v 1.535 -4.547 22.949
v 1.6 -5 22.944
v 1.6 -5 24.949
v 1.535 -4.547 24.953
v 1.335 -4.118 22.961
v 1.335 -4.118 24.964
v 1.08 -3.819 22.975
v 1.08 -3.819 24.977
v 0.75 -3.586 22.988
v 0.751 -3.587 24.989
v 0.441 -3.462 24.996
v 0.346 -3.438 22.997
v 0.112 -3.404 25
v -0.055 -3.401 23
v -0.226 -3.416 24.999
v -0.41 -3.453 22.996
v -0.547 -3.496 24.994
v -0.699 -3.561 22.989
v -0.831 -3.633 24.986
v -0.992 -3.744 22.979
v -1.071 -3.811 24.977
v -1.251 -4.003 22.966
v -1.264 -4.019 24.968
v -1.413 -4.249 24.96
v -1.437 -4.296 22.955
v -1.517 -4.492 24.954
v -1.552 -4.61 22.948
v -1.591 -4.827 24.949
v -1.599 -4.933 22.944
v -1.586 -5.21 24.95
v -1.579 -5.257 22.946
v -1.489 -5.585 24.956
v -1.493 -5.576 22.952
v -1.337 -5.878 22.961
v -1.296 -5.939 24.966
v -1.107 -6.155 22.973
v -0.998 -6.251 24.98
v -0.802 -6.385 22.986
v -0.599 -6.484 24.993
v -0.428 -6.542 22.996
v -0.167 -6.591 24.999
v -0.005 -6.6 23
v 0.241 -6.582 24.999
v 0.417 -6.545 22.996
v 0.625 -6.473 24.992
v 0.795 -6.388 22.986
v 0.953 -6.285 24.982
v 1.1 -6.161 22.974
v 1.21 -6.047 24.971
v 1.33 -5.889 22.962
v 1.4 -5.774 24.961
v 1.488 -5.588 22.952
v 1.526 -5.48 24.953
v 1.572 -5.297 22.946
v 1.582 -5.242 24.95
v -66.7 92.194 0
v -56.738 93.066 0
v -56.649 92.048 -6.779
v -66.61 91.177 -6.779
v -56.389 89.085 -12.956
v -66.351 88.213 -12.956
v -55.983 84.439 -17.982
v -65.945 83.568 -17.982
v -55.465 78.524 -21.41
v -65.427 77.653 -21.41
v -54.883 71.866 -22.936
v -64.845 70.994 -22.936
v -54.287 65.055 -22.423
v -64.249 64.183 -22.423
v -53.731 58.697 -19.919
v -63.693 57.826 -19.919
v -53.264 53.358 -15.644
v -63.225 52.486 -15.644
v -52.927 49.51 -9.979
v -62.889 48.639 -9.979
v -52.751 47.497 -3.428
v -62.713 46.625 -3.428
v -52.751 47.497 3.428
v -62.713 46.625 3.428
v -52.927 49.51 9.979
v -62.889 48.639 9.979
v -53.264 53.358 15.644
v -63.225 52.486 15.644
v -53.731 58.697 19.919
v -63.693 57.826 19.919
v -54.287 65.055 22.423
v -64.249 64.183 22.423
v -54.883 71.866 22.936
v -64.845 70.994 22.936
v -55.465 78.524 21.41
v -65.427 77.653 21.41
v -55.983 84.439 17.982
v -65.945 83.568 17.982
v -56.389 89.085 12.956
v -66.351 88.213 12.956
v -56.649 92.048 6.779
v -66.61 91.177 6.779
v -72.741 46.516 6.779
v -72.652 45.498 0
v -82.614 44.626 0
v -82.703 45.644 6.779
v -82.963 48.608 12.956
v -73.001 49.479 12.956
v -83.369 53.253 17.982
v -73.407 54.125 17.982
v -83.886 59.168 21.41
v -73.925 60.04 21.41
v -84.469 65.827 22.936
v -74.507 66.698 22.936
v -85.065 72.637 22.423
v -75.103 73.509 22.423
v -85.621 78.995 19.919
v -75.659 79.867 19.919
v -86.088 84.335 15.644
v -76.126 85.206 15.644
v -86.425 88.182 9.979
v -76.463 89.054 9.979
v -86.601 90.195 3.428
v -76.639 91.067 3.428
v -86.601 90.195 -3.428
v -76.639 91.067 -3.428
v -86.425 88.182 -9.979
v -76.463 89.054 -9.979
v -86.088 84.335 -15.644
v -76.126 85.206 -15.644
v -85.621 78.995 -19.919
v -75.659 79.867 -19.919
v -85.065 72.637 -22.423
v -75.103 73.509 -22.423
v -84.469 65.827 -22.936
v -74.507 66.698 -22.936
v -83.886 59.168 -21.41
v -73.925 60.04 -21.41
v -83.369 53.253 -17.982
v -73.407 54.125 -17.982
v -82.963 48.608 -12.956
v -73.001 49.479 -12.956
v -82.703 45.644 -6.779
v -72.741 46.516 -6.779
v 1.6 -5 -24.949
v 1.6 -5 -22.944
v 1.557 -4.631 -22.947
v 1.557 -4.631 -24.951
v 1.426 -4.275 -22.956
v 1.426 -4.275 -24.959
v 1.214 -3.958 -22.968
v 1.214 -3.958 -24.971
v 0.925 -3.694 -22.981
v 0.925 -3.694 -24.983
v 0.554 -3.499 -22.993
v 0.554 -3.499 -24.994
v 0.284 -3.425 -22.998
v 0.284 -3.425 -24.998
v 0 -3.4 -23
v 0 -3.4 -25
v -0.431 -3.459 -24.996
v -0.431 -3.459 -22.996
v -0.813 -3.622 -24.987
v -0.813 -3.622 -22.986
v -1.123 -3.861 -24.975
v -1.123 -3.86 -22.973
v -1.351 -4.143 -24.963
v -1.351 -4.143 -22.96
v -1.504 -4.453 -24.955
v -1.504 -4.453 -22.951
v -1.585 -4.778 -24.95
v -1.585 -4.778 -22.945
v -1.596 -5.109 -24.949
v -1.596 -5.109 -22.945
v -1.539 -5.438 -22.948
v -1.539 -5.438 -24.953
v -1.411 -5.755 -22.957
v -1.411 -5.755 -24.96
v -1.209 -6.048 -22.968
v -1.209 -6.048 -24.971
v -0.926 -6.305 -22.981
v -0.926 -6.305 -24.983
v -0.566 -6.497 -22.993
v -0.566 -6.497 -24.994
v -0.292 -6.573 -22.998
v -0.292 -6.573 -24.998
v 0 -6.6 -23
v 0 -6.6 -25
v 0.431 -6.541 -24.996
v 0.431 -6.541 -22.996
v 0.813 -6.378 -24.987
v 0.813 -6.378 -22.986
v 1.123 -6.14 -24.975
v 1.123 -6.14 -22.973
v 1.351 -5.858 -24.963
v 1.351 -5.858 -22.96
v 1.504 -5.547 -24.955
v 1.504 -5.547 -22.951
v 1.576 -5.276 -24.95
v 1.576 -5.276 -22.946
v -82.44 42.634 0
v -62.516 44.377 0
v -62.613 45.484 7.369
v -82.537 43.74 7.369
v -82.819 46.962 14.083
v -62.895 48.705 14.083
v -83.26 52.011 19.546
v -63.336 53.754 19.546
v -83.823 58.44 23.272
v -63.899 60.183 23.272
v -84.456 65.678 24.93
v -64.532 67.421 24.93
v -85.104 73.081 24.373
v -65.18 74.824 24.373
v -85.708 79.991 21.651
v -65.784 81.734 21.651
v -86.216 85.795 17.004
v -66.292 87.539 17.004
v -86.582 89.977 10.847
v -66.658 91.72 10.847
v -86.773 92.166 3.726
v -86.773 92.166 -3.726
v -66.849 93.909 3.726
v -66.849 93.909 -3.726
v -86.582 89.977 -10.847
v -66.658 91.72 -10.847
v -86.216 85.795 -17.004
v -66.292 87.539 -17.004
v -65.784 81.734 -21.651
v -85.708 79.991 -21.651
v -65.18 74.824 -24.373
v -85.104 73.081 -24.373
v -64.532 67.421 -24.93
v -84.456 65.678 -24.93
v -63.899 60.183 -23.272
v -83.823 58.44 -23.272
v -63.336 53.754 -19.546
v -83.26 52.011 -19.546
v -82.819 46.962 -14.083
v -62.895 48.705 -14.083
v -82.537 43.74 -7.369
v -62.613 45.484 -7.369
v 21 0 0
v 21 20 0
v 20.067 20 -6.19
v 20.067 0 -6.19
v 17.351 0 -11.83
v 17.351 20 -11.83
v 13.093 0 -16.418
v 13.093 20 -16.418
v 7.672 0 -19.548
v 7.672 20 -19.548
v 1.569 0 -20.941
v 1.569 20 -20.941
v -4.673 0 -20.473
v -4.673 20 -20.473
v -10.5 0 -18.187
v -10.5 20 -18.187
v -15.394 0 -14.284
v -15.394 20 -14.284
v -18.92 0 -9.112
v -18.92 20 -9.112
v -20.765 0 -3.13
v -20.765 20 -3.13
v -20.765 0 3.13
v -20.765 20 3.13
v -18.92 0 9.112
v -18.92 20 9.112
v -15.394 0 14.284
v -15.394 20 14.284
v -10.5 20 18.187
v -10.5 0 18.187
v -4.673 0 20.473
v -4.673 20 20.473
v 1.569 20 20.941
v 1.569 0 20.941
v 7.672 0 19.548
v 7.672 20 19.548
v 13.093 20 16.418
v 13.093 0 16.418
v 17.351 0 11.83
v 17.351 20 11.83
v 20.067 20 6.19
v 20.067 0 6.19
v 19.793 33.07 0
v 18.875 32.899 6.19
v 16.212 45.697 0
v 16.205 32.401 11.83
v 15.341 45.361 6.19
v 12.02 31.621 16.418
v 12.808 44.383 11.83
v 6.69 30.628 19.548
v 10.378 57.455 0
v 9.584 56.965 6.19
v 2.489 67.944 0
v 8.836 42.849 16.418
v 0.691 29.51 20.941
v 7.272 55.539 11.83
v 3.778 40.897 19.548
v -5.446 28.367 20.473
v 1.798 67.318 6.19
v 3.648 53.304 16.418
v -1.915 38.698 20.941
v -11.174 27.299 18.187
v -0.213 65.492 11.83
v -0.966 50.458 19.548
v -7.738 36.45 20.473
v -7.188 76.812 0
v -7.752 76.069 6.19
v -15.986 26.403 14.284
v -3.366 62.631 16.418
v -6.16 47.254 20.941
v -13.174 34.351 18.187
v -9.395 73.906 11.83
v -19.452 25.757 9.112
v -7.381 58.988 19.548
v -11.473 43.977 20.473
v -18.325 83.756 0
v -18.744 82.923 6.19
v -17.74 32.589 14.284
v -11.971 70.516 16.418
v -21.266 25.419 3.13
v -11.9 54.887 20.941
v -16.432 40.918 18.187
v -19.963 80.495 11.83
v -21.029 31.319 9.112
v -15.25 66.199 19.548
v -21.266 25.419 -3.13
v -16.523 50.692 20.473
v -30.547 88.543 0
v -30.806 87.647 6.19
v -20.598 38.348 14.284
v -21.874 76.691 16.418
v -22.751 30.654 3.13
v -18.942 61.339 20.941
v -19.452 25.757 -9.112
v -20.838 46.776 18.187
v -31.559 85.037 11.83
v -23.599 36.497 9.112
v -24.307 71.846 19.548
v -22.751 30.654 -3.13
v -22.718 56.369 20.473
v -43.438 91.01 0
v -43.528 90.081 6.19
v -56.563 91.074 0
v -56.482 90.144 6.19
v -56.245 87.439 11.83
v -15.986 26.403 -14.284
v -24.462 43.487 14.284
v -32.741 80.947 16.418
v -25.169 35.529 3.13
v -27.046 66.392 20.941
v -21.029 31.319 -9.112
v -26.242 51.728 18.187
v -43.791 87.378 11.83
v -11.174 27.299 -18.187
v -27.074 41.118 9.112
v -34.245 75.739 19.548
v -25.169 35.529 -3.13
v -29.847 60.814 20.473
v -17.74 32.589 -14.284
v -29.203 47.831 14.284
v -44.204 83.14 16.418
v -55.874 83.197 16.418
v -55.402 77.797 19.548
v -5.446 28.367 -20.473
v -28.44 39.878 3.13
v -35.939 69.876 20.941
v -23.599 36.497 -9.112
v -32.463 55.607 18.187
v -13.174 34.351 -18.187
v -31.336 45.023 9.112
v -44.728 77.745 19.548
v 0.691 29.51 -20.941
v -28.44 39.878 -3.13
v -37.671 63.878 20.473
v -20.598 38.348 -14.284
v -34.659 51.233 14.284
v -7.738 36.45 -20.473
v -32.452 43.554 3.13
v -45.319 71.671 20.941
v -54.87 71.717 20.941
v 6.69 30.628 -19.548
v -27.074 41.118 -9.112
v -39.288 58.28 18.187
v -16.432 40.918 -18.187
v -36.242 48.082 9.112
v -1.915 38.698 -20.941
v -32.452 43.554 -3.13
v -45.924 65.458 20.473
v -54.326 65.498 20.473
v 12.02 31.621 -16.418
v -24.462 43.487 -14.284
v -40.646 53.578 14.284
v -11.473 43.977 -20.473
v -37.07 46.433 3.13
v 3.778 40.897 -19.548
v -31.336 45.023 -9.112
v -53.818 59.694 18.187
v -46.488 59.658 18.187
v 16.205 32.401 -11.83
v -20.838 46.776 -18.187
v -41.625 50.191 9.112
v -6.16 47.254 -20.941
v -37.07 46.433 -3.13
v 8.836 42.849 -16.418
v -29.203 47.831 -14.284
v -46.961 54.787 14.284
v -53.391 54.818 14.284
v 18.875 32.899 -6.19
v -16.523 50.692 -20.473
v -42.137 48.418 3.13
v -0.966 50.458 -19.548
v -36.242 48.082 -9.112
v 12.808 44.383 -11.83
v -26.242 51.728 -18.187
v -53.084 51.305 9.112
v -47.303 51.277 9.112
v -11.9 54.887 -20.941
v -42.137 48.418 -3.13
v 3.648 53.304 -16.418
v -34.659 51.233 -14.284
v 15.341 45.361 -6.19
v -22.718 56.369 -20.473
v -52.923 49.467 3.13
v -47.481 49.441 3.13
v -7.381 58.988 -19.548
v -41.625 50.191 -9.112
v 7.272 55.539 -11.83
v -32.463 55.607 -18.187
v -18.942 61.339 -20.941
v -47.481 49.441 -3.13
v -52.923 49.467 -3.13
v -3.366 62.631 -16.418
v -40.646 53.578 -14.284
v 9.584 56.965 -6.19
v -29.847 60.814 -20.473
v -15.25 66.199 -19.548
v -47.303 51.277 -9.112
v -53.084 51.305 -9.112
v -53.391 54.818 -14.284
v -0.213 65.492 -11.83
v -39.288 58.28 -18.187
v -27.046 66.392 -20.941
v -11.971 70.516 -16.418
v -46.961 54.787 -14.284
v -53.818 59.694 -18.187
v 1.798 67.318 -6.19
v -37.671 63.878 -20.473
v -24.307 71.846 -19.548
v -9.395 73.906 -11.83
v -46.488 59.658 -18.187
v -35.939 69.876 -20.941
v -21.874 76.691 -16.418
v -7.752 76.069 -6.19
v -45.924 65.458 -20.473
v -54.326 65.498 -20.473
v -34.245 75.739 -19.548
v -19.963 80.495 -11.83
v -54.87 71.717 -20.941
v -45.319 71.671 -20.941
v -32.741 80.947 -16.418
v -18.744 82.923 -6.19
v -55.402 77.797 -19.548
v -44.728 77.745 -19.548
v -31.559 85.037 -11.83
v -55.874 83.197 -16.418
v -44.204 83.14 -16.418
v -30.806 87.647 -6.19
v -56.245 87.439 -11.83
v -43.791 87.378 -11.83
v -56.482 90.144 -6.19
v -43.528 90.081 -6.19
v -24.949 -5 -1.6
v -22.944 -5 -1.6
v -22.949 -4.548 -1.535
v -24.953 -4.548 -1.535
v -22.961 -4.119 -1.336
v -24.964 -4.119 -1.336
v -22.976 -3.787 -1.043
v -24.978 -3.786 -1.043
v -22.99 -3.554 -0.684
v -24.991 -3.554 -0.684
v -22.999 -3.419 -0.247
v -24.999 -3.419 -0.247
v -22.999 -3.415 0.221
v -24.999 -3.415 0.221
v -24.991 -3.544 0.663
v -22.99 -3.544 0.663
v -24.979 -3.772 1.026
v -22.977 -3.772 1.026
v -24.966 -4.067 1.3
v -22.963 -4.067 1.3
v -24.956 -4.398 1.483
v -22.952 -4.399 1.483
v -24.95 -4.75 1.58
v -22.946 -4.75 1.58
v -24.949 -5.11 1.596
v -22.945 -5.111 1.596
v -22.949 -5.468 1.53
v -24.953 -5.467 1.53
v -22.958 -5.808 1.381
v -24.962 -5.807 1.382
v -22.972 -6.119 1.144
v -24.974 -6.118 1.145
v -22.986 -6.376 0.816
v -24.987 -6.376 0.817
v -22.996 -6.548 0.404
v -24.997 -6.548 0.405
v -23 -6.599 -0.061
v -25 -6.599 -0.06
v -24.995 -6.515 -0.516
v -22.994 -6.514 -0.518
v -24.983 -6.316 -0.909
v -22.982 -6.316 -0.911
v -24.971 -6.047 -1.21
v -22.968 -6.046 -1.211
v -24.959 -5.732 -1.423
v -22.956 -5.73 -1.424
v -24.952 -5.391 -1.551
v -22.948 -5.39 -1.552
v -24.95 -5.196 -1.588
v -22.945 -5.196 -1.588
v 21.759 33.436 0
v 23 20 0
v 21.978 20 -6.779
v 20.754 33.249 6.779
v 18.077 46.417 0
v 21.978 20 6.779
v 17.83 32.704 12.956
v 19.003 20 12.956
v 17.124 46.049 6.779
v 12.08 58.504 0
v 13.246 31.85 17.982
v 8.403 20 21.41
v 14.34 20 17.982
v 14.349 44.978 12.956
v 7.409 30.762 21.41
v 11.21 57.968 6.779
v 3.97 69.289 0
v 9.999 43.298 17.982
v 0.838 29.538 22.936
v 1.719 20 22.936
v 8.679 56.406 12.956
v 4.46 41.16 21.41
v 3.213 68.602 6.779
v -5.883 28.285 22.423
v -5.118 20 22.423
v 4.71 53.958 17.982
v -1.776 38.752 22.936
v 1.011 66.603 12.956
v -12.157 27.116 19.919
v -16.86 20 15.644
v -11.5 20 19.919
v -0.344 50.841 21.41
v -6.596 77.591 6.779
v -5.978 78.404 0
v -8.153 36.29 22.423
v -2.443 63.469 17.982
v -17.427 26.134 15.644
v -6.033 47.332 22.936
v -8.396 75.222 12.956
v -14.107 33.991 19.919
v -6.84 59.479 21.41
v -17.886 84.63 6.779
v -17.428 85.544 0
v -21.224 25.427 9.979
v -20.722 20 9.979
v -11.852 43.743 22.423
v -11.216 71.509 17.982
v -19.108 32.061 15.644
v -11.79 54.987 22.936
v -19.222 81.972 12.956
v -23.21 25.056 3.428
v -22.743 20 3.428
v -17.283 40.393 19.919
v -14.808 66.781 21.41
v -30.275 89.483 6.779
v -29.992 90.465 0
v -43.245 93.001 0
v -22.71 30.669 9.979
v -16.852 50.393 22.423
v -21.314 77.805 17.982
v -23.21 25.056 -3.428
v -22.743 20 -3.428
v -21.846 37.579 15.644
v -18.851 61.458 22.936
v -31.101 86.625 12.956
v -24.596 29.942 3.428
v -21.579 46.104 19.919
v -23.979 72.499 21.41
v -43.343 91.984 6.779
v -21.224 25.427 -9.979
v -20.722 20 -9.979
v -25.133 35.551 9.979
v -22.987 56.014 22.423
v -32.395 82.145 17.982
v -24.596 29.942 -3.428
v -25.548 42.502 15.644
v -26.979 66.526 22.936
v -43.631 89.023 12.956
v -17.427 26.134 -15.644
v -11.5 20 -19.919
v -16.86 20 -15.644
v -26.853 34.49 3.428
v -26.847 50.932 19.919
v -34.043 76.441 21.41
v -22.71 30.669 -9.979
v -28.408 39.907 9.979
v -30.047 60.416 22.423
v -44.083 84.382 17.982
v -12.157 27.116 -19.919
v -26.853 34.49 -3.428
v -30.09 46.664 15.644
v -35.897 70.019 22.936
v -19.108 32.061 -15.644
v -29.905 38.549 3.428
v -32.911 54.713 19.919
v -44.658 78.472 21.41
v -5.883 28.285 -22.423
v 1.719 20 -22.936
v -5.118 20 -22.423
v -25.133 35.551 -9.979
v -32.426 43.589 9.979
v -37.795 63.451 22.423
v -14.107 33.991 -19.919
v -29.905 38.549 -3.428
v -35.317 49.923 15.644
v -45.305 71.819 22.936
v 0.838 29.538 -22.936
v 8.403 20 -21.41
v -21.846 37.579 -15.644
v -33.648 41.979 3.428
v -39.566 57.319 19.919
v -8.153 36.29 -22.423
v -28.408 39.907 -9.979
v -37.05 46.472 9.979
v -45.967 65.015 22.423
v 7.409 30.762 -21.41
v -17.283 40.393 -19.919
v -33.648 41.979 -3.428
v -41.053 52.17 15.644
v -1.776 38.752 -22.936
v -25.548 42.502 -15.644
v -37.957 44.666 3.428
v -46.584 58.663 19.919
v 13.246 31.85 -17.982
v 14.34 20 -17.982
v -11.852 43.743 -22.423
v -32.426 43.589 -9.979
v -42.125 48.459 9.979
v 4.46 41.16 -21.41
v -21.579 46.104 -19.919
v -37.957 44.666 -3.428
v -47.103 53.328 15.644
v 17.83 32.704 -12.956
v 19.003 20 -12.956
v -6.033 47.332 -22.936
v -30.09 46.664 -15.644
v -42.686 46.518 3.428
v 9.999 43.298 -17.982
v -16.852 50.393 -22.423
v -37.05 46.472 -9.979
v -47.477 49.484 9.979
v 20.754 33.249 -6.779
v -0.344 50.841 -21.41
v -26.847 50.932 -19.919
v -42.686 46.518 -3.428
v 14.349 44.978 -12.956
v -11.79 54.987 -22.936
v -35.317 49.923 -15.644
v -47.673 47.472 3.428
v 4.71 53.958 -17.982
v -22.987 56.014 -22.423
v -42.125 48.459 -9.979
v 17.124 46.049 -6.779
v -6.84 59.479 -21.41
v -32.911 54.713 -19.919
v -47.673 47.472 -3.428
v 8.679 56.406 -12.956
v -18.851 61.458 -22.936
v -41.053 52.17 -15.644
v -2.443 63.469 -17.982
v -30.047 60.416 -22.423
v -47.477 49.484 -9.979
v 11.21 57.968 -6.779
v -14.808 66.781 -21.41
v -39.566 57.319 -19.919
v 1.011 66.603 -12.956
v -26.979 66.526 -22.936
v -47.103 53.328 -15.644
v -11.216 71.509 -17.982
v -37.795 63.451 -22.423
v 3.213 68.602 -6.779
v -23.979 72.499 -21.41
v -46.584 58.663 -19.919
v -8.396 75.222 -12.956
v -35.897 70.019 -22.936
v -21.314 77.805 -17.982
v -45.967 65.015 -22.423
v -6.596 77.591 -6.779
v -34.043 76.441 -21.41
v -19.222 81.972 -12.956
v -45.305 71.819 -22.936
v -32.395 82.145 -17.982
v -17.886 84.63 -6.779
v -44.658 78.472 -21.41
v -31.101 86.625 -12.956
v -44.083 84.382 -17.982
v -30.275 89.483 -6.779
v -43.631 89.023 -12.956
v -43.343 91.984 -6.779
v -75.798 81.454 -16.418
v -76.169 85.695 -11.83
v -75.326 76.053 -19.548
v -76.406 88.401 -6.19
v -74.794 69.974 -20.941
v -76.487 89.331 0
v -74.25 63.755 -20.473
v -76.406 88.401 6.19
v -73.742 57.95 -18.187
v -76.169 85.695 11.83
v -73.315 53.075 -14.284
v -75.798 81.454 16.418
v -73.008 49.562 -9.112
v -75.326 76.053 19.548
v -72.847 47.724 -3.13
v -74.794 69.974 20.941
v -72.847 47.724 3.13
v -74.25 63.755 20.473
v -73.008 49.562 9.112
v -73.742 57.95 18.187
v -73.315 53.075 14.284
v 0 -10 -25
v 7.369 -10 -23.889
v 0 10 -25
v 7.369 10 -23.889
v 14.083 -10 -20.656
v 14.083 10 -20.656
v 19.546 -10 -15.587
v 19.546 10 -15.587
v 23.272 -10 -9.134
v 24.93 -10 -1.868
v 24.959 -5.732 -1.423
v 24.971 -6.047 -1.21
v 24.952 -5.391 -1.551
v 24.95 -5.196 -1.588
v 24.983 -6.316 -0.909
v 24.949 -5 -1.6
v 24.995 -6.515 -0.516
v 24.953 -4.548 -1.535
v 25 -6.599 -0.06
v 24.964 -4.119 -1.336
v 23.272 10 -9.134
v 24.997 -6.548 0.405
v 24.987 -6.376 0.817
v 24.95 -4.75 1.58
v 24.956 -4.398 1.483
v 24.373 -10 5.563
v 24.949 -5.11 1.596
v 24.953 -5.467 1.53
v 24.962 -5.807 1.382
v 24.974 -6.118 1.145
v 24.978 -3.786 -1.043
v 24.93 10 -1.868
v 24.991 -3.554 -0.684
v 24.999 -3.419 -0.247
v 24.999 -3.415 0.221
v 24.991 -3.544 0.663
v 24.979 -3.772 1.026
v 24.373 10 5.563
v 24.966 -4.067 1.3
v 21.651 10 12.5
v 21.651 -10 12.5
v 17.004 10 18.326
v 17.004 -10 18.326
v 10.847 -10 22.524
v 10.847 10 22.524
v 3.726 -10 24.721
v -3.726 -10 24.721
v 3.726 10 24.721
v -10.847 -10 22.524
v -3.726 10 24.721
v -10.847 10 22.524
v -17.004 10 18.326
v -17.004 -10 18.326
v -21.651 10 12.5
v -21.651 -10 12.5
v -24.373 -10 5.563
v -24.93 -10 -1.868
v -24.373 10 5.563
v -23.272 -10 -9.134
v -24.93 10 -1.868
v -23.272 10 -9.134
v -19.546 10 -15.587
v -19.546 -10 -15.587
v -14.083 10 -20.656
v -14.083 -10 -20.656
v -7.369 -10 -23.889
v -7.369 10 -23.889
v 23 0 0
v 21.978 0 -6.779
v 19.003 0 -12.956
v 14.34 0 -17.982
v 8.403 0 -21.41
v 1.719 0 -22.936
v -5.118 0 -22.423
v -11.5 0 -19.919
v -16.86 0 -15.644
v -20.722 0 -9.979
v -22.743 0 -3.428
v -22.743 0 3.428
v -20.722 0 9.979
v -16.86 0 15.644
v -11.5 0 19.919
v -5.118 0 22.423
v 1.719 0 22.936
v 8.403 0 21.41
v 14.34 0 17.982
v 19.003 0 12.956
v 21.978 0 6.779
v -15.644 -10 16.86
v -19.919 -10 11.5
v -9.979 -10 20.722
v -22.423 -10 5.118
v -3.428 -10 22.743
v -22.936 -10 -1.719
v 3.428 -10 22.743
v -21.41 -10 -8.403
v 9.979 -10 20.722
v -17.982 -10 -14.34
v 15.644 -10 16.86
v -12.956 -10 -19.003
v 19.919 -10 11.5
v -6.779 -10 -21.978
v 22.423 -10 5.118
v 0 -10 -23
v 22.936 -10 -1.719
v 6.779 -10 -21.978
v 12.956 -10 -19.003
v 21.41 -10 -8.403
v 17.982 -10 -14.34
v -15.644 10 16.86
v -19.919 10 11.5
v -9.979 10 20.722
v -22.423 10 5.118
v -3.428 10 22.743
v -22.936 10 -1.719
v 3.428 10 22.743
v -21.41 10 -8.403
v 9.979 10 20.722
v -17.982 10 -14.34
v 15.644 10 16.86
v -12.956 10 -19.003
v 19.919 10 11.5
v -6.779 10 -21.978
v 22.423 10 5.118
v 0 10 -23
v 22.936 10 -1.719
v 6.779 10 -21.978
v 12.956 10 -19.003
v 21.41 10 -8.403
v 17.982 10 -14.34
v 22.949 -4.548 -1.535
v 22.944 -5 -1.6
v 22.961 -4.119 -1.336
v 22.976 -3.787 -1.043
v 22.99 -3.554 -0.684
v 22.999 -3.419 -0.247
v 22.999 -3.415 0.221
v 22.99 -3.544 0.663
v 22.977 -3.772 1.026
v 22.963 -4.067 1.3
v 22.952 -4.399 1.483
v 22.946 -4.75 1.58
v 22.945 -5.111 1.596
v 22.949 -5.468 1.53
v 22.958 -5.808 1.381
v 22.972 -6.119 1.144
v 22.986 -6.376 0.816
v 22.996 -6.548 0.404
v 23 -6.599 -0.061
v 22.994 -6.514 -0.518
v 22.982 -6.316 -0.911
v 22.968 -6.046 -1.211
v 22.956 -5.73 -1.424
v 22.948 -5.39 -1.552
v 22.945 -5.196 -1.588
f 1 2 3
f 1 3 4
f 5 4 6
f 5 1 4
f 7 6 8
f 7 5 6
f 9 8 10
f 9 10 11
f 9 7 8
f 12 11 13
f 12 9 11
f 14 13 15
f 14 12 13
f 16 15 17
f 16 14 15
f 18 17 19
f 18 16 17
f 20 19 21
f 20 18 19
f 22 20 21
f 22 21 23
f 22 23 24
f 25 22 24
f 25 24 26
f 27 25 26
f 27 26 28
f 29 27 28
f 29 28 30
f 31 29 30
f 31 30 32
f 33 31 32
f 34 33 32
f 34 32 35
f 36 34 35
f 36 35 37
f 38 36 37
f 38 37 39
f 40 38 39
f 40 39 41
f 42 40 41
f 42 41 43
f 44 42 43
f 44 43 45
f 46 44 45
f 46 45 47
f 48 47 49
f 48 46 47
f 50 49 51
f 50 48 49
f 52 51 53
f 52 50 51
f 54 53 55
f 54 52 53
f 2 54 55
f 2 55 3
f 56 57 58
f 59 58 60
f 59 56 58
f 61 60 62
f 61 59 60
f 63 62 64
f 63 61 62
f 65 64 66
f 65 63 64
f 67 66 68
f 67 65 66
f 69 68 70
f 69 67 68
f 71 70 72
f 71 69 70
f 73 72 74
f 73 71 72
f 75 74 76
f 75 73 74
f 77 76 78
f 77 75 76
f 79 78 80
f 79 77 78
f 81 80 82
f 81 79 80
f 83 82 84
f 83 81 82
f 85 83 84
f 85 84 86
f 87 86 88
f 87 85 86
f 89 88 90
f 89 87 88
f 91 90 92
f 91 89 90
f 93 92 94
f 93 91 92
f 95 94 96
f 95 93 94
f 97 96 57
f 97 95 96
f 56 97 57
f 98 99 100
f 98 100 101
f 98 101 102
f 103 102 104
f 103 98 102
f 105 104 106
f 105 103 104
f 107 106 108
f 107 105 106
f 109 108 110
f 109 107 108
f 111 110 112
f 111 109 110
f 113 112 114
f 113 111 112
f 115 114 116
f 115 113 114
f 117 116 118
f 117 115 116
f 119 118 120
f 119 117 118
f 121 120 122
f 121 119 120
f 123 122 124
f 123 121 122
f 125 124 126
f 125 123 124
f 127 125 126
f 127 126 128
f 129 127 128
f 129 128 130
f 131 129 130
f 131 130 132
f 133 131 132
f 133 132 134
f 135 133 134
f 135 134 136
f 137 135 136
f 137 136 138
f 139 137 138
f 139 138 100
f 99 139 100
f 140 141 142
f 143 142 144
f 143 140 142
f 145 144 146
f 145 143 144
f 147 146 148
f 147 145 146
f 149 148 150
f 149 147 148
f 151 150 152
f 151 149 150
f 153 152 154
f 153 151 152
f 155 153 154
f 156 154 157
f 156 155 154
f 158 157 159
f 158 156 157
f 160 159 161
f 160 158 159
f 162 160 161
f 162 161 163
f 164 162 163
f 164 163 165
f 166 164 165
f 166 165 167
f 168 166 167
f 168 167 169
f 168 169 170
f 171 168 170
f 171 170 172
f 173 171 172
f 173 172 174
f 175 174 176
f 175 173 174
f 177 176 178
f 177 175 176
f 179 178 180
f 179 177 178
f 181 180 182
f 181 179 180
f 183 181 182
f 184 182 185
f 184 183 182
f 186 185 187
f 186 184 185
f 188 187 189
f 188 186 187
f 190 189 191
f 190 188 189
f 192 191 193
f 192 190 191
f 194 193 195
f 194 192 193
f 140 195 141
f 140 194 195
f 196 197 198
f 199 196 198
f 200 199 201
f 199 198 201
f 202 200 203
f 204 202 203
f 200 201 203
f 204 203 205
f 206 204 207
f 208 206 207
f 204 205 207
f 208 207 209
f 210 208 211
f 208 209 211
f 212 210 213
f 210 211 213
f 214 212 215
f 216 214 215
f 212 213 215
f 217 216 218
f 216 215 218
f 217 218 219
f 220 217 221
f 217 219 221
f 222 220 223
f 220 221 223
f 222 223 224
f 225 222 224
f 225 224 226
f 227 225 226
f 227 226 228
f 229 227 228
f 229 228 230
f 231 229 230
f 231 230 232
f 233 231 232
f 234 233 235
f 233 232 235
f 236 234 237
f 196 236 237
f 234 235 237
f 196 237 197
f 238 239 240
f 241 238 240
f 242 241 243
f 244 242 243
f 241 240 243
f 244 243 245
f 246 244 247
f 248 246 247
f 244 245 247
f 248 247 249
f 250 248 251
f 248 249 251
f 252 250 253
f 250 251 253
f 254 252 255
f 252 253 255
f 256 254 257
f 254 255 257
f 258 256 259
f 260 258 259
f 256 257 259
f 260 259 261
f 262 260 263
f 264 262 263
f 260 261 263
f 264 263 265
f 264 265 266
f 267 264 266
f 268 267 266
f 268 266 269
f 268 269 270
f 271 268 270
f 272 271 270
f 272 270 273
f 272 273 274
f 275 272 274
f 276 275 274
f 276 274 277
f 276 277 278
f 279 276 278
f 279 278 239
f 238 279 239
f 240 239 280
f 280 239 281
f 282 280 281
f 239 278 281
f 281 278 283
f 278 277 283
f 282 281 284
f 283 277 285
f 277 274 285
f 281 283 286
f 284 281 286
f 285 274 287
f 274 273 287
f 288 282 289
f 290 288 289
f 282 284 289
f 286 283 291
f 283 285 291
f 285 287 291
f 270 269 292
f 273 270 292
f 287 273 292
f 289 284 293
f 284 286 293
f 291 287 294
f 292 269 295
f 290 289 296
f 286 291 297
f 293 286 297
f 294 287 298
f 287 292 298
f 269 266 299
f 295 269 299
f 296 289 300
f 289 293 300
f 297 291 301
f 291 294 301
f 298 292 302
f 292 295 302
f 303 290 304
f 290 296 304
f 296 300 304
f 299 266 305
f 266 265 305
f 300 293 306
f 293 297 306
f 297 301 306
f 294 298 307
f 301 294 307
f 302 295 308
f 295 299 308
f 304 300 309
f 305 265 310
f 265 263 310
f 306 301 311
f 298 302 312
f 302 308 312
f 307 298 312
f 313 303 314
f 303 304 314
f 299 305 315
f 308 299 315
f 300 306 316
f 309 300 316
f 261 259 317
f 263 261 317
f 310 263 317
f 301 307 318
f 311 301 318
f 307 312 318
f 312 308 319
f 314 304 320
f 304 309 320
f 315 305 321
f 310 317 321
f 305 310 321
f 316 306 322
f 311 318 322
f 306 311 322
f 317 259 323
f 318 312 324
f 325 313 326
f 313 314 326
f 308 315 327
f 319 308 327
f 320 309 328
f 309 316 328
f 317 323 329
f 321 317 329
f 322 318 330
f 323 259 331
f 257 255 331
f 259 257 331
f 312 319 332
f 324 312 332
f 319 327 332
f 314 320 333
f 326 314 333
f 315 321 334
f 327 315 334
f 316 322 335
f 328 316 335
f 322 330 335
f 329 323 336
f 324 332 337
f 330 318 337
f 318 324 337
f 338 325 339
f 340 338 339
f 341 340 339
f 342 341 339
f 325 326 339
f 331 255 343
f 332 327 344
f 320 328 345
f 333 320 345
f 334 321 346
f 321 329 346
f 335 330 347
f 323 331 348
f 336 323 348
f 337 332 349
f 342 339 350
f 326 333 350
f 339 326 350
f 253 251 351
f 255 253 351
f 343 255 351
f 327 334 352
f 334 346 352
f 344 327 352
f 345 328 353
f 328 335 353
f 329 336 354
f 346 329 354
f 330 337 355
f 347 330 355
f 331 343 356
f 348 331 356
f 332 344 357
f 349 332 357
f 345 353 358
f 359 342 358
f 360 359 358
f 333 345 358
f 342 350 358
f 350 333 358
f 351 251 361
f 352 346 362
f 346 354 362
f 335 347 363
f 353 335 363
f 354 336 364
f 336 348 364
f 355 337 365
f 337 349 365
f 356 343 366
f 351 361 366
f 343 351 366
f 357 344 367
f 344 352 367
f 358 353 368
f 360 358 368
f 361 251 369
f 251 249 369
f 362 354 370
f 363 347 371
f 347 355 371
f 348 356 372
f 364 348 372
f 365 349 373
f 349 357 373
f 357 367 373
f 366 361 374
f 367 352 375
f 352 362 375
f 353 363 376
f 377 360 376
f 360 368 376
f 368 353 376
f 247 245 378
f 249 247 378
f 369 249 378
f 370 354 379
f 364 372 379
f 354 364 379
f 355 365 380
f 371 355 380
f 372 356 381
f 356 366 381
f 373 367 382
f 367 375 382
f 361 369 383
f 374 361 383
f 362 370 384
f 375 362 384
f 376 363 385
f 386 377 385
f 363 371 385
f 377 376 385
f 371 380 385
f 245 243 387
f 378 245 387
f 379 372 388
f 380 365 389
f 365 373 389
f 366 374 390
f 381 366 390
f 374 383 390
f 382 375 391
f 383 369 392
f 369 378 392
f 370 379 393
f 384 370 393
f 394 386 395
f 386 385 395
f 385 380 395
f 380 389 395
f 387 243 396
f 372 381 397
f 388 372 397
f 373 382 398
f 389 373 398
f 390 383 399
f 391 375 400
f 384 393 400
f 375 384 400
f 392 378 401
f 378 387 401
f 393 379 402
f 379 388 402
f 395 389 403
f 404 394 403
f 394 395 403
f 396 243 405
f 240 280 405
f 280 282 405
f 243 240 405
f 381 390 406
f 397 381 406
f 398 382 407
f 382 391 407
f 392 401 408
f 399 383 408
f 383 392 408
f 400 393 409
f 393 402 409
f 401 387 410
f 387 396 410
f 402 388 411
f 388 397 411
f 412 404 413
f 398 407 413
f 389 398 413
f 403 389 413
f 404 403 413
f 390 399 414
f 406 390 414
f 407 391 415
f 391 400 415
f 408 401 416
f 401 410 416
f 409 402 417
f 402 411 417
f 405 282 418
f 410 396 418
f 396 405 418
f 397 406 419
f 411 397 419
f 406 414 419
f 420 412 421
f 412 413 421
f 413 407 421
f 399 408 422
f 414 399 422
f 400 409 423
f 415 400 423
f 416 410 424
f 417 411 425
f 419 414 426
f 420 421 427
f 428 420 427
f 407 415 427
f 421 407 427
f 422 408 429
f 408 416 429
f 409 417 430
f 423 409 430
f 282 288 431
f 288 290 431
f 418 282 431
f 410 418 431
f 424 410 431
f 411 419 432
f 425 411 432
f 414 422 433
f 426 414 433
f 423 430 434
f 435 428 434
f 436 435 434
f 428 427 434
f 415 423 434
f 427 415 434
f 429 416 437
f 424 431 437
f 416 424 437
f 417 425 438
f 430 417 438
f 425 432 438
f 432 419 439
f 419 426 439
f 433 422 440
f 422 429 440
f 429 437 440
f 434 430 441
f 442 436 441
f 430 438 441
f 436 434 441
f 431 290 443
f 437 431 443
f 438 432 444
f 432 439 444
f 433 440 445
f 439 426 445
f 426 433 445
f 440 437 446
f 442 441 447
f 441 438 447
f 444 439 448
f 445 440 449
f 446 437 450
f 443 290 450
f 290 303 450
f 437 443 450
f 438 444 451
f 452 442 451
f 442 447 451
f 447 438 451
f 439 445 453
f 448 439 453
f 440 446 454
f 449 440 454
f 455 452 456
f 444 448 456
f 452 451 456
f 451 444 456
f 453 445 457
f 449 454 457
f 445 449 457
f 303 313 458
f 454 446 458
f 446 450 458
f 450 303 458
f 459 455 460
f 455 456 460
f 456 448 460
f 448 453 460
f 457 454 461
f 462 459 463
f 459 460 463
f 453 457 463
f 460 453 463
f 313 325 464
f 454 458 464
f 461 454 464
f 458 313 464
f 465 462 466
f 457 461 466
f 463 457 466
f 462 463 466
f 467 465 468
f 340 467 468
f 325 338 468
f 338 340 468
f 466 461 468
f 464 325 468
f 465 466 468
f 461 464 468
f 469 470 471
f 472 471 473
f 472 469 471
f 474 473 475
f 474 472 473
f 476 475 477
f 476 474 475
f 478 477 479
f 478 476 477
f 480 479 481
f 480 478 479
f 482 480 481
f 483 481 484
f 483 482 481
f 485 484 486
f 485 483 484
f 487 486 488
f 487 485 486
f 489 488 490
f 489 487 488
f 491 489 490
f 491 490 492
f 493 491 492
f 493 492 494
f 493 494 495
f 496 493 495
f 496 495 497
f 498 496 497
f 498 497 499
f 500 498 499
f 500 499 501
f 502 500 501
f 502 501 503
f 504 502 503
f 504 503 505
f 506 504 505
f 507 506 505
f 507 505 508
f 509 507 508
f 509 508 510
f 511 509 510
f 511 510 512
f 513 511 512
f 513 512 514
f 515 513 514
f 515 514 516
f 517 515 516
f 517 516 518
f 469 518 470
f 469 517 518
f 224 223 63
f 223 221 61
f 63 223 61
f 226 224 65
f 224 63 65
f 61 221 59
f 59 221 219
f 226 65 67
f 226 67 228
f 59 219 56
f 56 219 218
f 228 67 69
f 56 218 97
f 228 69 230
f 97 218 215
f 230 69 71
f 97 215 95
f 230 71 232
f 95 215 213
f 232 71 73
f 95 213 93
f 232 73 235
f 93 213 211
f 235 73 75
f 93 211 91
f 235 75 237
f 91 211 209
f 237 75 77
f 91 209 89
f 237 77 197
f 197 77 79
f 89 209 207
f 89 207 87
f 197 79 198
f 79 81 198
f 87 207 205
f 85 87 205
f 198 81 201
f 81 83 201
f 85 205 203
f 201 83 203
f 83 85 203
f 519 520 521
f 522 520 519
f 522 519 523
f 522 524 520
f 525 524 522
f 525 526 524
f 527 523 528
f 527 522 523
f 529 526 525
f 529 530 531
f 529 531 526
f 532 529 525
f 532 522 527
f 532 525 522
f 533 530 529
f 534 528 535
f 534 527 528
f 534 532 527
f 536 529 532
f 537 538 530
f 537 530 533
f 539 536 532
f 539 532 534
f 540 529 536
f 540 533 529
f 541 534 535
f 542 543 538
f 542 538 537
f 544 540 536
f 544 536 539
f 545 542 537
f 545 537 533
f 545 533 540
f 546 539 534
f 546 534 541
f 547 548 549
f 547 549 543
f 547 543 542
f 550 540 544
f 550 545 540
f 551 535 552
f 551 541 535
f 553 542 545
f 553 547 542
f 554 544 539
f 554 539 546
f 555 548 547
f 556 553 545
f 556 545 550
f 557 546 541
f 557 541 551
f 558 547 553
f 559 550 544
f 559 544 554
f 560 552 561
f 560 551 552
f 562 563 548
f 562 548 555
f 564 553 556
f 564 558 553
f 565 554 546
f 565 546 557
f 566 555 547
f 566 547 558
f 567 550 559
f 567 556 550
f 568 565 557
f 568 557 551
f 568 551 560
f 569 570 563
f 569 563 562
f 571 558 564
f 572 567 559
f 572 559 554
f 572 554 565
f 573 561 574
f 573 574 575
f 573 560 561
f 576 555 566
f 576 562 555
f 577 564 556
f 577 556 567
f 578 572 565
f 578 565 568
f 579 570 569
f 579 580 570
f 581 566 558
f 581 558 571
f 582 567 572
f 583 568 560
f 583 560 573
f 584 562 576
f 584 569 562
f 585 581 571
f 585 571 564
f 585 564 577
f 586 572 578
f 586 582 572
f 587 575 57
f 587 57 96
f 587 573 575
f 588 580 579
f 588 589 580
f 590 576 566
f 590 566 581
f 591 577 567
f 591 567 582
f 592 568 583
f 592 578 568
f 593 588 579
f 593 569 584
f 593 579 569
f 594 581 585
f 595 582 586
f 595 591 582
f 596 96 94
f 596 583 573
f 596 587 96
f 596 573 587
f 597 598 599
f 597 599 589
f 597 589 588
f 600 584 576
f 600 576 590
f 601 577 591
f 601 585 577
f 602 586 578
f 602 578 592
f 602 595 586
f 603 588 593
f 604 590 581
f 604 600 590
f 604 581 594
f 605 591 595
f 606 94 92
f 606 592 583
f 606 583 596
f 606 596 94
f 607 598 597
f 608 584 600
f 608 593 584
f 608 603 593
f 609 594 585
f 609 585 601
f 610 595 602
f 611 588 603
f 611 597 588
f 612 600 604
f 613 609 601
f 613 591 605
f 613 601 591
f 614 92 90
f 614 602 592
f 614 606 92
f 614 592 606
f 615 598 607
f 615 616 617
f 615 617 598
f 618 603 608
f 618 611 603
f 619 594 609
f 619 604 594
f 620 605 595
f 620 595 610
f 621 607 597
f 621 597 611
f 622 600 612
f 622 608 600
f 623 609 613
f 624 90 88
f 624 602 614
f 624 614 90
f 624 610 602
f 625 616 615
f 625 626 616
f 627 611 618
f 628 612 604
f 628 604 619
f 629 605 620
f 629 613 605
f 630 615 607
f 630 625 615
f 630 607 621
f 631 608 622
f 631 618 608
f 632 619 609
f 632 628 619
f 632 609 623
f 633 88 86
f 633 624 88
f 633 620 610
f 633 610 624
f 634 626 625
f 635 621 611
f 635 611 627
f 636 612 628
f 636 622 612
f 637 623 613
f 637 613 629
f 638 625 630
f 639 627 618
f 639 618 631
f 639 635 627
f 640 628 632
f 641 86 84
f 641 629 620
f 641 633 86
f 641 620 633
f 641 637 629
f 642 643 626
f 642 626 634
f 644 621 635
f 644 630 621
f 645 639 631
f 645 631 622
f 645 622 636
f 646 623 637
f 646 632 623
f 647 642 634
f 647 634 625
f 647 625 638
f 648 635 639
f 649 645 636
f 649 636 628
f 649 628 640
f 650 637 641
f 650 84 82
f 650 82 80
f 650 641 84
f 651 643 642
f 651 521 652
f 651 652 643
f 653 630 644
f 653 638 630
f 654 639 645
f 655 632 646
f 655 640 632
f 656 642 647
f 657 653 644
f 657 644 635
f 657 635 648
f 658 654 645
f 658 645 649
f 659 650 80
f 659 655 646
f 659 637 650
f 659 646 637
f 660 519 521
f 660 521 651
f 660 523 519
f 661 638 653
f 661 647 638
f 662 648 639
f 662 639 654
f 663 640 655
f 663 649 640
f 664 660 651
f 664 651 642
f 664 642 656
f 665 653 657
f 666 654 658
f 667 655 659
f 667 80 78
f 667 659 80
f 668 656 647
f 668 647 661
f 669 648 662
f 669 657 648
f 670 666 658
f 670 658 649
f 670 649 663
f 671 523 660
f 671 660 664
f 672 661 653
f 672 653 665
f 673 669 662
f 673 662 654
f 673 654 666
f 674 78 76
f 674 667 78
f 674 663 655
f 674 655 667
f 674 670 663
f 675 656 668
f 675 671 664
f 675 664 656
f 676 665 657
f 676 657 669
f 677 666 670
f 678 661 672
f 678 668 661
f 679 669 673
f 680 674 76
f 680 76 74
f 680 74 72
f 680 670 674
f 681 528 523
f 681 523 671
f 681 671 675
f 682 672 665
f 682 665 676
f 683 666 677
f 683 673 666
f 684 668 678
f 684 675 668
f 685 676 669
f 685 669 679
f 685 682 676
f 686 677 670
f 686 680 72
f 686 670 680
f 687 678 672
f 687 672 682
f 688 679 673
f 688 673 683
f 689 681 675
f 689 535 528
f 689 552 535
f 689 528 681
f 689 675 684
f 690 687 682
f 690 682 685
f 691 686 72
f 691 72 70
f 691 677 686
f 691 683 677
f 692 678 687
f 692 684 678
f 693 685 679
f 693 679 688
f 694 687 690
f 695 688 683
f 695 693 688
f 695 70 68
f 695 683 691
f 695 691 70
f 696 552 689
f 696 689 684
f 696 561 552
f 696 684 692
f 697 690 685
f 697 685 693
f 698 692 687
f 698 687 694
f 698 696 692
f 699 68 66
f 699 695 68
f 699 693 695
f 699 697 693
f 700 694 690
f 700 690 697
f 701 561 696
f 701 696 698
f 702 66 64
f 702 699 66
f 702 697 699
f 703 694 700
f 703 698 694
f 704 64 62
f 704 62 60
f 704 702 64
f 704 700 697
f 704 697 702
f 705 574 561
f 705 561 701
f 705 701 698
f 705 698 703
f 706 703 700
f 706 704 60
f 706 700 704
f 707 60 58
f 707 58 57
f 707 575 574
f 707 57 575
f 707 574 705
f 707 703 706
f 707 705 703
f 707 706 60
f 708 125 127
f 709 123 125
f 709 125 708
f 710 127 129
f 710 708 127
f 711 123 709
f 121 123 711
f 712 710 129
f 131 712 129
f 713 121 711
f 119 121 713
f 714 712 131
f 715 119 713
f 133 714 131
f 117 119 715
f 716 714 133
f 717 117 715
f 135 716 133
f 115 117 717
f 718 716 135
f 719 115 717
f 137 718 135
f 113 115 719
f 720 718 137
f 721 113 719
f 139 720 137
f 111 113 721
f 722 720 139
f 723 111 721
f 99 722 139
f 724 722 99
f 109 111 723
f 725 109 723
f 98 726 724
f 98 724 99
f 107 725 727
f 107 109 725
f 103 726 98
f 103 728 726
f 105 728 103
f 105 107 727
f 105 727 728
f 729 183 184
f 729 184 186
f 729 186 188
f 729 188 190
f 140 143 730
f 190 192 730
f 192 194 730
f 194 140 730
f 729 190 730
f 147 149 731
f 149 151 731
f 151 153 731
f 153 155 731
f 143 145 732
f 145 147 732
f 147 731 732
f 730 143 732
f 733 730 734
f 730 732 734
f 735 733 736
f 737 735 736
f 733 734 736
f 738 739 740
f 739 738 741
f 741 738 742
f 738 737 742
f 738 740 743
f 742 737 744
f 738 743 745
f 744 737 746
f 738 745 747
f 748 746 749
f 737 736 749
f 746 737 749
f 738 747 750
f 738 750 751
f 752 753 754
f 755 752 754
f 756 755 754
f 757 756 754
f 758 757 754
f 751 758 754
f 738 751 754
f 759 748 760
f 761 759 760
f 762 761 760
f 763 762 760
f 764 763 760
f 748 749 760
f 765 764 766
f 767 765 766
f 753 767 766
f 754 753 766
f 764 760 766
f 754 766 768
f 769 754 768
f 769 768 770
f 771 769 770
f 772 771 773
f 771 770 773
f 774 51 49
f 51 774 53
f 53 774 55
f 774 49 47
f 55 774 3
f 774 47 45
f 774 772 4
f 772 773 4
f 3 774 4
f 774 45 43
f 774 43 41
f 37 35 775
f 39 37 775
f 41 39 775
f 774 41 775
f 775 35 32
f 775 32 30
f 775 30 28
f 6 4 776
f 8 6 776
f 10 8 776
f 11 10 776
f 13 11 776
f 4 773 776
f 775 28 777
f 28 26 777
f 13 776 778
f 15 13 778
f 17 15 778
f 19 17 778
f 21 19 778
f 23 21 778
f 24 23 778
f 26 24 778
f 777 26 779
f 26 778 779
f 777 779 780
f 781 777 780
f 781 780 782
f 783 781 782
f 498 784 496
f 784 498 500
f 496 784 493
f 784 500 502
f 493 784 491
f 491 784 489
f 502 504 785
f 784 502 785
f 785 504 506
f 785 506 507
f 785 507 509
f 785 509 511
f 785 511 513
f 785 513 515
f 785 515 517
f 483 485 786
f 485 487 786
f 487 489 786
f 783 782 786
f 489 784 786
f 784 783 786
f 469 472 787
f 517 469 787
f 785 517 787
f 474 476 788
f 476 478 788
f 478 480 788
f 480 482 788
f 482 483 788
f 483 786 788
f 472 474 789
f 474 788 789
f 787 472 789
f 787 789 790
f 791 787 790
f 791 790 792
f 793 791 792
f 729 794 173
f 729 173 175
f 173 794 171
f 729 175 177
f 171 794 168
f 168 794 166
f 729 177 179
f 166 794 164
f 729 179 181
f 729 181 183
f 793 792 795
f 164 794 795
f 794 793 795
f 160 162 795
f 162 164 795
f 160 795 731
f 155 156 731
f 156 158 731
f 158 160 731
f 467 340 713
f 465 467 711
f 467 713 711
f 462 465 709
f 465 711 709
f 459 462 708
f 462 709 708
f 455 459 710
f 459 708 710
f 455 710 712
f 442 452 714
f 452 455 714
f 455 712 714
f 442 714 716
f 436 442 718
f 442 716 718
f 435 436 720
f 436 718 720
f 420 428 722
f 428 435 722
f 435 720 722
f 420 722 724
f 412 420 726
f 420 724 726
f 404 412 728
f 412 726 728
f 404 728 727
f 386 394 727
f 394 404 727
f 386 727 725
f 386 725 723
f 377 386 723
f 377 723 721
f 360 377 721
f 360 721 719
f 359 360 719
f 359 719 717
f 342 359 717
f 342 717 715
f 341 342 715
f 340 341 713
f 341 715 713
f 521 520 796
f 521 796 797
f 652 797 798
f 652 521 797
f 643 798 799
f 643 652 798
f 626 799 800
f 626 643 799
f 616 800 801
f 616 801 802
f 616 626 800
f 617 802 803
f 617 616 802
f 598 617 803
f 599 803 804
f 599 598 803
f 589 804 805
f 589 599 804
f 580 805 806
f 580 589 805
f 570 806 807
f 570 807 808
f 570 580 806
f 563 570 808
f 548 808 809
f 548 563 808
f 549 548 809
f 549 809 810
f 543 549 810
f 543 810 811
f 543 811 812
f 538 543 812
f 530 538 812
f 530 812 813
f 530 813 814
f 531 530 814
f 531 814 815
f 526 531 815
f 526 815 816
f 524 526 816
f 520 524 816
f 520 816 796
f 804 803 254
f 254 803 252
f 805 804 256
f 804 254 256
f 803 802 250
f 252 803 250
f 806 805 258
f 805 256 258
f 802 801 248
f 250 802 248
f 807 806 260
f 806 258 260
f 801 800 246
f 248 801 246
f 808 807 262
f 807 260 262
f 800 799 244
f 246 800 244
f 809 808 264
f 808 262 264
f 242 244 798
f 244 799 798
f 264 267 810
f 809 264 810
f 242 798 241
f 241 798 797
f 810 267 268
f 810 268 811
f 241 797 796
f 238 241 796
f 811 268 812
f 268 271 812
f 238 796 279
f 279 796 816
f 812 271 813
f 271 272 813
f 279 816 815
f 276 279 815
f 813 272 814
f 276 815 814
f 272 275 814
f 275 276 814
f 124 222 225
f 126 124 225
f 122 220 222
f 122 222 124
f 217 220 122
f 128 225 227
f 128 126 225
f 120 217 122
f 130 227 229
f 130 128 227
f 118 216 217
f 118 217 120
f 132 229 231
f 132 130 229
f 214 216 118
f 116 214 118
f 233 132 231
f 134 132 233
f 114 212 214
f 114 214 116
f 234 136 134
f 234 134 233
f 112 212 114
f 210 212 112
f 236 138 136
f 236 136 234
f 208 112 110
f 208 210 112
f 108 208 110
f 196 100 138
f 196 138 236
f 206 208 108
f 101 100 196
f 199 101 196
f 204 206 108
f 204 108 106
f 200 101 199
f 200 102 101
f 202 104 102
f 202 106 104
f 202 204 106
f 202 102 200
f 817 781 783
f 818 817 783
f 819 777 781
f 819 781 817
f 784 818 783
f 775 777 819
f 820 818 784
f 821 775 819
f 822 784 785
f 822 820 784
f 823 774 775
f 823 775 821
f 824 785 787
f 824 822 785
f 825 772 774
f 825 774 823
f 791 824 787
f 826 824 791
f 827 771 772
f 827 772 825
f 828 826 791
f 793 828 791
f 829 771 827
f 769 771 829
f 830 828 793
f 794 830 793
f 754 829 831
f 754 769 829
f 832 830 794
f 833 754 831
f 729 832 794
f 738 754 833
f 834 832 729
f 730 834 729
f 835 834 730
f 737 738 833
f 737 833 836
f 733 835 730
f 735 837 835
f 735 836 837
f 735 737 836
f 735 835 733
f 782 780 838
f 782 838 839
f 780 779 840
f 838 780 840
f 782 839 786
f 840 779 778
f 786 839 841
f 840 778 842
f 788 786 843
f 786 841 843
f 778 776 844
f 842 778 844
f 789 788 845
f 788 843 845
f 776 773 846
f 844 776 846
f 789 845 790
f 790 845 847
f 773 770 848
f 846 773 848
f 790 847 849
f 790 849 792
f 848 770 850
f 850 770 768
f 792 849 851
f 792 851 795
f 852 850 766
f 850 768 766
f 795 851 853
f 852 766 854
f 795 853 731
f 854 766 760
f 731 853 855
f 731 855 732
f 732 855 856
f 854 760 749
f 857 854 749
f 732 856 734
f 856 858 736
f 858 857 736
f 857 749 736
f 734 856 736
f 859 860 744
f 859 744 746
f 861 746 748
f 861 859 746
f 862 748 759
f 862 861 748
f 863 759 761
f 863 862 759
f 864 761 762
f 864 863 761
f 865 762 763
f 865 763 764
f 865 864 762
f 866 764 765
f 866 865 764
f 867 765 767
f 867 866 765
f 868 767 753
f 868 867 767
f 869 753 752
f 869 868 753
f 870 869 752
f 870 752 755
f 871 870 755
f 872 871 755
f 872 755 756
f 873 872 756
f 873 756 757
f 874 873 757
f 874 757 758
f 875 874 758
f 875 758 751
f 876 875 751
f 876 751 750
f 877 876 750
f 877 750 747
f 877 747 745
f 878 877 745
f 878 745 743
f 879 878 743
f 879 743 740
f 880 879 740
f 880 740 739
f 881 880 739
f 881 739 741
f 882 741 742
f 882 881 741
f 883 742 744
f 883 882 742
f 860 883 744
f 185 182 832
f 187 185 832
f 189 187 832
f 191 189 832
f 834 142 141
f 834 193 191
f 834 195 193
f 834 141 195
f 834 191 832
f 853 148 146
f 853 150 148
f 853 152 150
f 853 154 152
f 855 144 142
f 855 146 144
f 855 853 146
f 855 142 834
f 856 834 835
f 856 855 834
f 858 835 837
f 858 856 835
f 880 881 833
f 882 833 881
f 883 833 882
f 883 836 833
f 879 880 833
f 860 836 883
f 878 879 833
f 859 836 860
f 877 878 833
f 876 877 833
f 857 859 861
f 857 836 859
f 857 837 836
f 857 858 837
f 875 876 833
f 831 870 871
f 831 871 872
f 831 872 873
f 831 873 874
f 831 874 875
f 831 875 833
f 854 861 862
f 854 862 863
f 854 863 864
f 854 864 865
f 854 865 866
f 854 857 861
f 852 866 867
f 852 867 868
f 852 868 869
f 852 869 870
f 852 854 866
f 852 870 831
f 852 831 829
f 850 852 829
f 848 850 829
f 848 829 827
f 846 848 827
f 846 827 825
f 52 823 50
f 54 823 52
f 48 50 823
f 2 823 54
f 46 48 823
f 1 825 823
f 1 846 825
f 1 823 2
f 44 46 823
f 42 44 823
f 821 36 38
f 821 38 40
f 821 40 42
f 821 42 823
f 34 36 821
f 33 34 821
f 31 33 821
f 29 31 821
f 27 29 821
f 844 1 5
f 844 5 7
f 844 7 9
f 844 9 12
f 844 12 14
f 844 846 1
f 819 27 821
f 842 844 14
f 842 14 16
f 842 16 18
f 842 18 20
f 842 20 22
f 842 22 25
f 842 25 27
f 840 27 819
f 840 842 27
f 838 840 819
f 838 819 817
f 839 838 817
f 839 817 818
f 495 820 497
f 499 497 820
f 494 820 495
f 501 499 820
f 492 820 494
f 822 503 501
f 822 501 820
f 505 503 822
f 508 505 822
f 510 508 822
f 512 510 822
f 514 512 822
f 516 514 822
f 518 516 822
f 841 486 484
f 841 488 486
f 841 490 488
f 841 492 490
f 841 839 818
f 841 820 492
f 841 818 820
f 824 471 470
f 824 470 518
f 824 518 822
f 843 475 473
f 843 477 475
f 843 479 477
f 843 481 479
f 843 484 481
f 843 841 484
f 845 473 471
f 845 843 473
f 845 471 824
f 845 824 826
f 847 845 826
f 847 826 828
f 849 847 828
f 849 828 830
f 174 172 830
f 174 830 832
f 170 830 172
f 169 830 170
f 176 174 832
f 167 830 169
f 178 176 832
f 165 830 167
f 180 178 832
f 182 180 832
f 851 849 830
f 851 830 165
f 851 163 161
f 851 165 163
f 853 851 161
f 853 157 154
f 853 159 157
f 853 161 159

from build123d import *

# Parameters (mm, degrees)
SKETCH_1_R               = 23
SKETCH_1_R_2             = 21
EXTRUDE_1_DEPTH          = 10
EXTRUDE_1_DEPTH_BACK     = 10
SKETCH_3_R               = 25
SKETCH_3_R_2             = 23
EXTRUDE_2_DEPTH          = 10
EXTRUDE_2_DEPTH_BACK     = 10
SKETCH_4_R               = 25
SKETCH_4_R_2             = 23
CUT_EXTRUDE_1_DEPTH      = 131.4990784
CUT_EXTRUDE_1_DEPTH_BACK = 131.4990784
SKETCH_5_R               = 1.6
CUT_EXTRUDE_2_DEPTH      = 131.499078423
CUT_EXTRUDE_2_DEPTH_BACK = 131.499078423
SKETCH_7_R               = 1.6


with BuildPart() as part:
    # 扫描1: sweep along a path in 草图2
    with BuildLine(Plane.XY) as sweep_1_path:
        Line((0, 0), (0, 20))
        ThreePointArc((0, 20), (-16.332451735, 57.118320104), (-54.732992387, 70.153547171))
        Line((-54.732992387, 70.153547171), (-74.656886349, 68.410432316))
    # 草图1 → 扫描1 (sweep)
    with BuildSketch(Plane(origin=(0, 0, 0), x_dir=(1, 0, 0), z_dir=(0, 1, 0))):
        Circle(SKETCH_1_R)
        Circle(SKETCH_1_R_2, mode=Mode.SUBTRACT)
    sweep(path=sweep_1_path.line)

    # 草图4 → 凸台-拉伸2 (add, two sides: drawn at the far end of the back side and taken through both)
    with BuildSketch(Plane(origin=(-68.150109968, -5.96236204, 0), x_dir=(0, 0, 1), z_dir=(-0.9961946980917464, -0.08715574274764801, 0)).offset(-EXTRUDE_2_DEPTH_BACK)):
        with Locations((0, 74.656886349)):
            Circle(SKETCH_4_R)
        with Locations((0, 74.656886349)):
            Circle(SKETCH_4_R_2, mode=Mode.SUBTRACT)
    extrude(amount=EXTRUDE_2_DEPTH + EXTRUDE_2_DEPTH_BACK)


with BuildPart() as body_2:
    # 草图3 → 凸台-拉伸1 (new, two sides: drawn at the far end of the back side and taken through both)
    with BuildSketch(Plane.XZ.offset(-EXTRUDE_1_DEPTH_BACK)):
        Circle(SKETCH_3_R)
        Circle(SKETCH_3_R_2, mode=Mode.SUBTRACT)
    extrude(amount=EXTRUDE_1_DEPTH + EXTRUDE_1_DEPTH_BACK)

    # 草图5 → 切除-拉伸1 (cut, two sides: drawn at the far end of the back side and taken through both)
    with BuildSketch(Plane.XY.offset(-CUT_EXTRUDE_1_DEPTH_BACK)):
        with Locations((0, -5)):
            Circle(SKETCH_5_R)
    extrude(amount=CUT_EXTRUDE_1_DEPTH + CUT_EXTRUDE_1_DEPTH_BACK, mode=Mode.SUBTRACT)

    # 草图7 → 切除-拉伸2 (cut, two sides: drawn at the far end of the back side and taken through both)
    with BuildSketch(Plane(origin=(0, 0, 0), x_dir=(0, 0, -1), z_dir=(1, 0, 0)).offset(-CUT_EXTRUDE_2_DEPTH_BACK)):
        with Locations((0, -5)):
            Circle(SKETCH_7_R)
    extrude(amount=CUT_EXTRUDE_2_DEPTH + CUT_EXTRUDE_2_DEPTH_BACK, mode=Mode.SUBTRACT)


solid = Compound([part.part, body_2.part])
